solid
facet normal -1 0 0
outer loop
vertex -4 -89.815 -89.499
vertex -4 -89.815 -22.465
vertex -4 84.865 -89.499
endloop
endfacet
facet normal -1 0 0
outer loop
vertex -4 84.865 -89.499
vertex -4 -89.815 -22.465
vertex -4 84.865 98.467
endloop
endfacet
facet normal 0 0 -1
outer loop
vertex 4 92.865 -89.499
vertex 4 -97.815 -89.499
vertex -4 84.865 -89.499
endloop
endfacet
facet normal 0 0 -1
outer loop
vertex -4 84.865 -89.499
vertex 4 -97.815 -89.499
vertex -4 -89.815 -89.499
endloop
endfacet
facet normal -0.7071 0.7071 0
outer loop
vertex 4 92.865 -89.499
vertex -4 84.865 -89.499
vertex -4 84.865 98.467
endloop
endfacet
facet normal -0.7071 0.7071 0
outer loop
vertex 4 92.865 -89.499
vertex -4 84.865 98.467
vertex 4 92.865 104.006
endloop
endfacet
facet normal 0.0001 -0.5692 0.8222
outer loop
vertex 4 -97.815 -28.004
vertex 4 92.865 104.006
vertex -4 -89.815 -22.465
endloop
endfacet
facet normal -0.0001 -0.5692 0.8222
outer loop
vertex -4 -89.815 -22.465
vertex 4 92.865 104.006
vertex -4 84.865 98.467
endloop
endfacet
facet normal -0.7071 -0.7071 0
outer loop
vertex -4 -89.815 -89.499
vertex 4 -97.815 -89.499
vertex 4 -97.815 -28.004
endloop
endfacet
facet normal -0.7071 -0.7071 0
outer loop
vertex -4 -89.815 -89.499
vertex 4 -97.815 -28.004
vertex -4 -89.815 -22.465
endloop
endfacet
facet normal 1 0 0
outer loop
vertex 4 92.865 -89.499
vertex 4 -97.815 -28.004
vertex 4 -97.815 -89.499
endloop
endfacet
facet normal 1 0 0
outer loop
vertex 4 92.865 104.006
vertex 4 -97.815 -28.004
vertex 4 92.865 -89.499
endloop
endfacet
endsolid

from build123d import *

# Parameters (mm, degrees)
F1_DEPTH    = 4.0000047
F2_T1_DEPTH = 112.2565983155
F3_T1_DEPTH = 247.2565983155


# Not quite as in the source:
# - a fillet or chamfer that OpenCascade refuses, or shapes differently, is made with other operations: its cross-section is extruded or revolved along the edge and cut away or added


with BuildPart() as f1:
    # F0 (on Right) → F1 (new body, symmetric)
    with BuildSketch(Plane.YZ):
        Polygon((-99.9751089393, -29.498891169), (-99.9751089393, -89.4988911689), (95.0248910607, -89.4988911689), (95.0248910607, 105.5011088311), align=None)
    extrude(amount=F1_DEPTH, both=True)

    # F2: chamfer of 10.16 on 1 edges, made by hand

    # F2_s2 → F2_t1 (cut)
    with BuildSketch(Plane.XY.offset(-115.6271903267)):
        Polygon((6.1599953, -99.9751089393), (-4.0000047, -89.8151089393), (-4.0000047, -99.9751089393), align=None)
    extrude(amount=F2_T1_DEPTH, mode=Mode.SUBTRACT)

    # F3: chamfer of 10.16 on 1 edges, made by hand

    # F3_s2 → F3_t1 (cut)
    with BuildSketch(Plane.XY.offset(-115.6271903267)):
        Polygon((-4.0000047, 84.8648910607), (6.1599953, 95.0248910607), (-4.0000047, 95.0248910607), align=None)
    extrude(amount=F3_T1_DEPTH, mode=Mode.SUBTRACT)


solid = f1.part
